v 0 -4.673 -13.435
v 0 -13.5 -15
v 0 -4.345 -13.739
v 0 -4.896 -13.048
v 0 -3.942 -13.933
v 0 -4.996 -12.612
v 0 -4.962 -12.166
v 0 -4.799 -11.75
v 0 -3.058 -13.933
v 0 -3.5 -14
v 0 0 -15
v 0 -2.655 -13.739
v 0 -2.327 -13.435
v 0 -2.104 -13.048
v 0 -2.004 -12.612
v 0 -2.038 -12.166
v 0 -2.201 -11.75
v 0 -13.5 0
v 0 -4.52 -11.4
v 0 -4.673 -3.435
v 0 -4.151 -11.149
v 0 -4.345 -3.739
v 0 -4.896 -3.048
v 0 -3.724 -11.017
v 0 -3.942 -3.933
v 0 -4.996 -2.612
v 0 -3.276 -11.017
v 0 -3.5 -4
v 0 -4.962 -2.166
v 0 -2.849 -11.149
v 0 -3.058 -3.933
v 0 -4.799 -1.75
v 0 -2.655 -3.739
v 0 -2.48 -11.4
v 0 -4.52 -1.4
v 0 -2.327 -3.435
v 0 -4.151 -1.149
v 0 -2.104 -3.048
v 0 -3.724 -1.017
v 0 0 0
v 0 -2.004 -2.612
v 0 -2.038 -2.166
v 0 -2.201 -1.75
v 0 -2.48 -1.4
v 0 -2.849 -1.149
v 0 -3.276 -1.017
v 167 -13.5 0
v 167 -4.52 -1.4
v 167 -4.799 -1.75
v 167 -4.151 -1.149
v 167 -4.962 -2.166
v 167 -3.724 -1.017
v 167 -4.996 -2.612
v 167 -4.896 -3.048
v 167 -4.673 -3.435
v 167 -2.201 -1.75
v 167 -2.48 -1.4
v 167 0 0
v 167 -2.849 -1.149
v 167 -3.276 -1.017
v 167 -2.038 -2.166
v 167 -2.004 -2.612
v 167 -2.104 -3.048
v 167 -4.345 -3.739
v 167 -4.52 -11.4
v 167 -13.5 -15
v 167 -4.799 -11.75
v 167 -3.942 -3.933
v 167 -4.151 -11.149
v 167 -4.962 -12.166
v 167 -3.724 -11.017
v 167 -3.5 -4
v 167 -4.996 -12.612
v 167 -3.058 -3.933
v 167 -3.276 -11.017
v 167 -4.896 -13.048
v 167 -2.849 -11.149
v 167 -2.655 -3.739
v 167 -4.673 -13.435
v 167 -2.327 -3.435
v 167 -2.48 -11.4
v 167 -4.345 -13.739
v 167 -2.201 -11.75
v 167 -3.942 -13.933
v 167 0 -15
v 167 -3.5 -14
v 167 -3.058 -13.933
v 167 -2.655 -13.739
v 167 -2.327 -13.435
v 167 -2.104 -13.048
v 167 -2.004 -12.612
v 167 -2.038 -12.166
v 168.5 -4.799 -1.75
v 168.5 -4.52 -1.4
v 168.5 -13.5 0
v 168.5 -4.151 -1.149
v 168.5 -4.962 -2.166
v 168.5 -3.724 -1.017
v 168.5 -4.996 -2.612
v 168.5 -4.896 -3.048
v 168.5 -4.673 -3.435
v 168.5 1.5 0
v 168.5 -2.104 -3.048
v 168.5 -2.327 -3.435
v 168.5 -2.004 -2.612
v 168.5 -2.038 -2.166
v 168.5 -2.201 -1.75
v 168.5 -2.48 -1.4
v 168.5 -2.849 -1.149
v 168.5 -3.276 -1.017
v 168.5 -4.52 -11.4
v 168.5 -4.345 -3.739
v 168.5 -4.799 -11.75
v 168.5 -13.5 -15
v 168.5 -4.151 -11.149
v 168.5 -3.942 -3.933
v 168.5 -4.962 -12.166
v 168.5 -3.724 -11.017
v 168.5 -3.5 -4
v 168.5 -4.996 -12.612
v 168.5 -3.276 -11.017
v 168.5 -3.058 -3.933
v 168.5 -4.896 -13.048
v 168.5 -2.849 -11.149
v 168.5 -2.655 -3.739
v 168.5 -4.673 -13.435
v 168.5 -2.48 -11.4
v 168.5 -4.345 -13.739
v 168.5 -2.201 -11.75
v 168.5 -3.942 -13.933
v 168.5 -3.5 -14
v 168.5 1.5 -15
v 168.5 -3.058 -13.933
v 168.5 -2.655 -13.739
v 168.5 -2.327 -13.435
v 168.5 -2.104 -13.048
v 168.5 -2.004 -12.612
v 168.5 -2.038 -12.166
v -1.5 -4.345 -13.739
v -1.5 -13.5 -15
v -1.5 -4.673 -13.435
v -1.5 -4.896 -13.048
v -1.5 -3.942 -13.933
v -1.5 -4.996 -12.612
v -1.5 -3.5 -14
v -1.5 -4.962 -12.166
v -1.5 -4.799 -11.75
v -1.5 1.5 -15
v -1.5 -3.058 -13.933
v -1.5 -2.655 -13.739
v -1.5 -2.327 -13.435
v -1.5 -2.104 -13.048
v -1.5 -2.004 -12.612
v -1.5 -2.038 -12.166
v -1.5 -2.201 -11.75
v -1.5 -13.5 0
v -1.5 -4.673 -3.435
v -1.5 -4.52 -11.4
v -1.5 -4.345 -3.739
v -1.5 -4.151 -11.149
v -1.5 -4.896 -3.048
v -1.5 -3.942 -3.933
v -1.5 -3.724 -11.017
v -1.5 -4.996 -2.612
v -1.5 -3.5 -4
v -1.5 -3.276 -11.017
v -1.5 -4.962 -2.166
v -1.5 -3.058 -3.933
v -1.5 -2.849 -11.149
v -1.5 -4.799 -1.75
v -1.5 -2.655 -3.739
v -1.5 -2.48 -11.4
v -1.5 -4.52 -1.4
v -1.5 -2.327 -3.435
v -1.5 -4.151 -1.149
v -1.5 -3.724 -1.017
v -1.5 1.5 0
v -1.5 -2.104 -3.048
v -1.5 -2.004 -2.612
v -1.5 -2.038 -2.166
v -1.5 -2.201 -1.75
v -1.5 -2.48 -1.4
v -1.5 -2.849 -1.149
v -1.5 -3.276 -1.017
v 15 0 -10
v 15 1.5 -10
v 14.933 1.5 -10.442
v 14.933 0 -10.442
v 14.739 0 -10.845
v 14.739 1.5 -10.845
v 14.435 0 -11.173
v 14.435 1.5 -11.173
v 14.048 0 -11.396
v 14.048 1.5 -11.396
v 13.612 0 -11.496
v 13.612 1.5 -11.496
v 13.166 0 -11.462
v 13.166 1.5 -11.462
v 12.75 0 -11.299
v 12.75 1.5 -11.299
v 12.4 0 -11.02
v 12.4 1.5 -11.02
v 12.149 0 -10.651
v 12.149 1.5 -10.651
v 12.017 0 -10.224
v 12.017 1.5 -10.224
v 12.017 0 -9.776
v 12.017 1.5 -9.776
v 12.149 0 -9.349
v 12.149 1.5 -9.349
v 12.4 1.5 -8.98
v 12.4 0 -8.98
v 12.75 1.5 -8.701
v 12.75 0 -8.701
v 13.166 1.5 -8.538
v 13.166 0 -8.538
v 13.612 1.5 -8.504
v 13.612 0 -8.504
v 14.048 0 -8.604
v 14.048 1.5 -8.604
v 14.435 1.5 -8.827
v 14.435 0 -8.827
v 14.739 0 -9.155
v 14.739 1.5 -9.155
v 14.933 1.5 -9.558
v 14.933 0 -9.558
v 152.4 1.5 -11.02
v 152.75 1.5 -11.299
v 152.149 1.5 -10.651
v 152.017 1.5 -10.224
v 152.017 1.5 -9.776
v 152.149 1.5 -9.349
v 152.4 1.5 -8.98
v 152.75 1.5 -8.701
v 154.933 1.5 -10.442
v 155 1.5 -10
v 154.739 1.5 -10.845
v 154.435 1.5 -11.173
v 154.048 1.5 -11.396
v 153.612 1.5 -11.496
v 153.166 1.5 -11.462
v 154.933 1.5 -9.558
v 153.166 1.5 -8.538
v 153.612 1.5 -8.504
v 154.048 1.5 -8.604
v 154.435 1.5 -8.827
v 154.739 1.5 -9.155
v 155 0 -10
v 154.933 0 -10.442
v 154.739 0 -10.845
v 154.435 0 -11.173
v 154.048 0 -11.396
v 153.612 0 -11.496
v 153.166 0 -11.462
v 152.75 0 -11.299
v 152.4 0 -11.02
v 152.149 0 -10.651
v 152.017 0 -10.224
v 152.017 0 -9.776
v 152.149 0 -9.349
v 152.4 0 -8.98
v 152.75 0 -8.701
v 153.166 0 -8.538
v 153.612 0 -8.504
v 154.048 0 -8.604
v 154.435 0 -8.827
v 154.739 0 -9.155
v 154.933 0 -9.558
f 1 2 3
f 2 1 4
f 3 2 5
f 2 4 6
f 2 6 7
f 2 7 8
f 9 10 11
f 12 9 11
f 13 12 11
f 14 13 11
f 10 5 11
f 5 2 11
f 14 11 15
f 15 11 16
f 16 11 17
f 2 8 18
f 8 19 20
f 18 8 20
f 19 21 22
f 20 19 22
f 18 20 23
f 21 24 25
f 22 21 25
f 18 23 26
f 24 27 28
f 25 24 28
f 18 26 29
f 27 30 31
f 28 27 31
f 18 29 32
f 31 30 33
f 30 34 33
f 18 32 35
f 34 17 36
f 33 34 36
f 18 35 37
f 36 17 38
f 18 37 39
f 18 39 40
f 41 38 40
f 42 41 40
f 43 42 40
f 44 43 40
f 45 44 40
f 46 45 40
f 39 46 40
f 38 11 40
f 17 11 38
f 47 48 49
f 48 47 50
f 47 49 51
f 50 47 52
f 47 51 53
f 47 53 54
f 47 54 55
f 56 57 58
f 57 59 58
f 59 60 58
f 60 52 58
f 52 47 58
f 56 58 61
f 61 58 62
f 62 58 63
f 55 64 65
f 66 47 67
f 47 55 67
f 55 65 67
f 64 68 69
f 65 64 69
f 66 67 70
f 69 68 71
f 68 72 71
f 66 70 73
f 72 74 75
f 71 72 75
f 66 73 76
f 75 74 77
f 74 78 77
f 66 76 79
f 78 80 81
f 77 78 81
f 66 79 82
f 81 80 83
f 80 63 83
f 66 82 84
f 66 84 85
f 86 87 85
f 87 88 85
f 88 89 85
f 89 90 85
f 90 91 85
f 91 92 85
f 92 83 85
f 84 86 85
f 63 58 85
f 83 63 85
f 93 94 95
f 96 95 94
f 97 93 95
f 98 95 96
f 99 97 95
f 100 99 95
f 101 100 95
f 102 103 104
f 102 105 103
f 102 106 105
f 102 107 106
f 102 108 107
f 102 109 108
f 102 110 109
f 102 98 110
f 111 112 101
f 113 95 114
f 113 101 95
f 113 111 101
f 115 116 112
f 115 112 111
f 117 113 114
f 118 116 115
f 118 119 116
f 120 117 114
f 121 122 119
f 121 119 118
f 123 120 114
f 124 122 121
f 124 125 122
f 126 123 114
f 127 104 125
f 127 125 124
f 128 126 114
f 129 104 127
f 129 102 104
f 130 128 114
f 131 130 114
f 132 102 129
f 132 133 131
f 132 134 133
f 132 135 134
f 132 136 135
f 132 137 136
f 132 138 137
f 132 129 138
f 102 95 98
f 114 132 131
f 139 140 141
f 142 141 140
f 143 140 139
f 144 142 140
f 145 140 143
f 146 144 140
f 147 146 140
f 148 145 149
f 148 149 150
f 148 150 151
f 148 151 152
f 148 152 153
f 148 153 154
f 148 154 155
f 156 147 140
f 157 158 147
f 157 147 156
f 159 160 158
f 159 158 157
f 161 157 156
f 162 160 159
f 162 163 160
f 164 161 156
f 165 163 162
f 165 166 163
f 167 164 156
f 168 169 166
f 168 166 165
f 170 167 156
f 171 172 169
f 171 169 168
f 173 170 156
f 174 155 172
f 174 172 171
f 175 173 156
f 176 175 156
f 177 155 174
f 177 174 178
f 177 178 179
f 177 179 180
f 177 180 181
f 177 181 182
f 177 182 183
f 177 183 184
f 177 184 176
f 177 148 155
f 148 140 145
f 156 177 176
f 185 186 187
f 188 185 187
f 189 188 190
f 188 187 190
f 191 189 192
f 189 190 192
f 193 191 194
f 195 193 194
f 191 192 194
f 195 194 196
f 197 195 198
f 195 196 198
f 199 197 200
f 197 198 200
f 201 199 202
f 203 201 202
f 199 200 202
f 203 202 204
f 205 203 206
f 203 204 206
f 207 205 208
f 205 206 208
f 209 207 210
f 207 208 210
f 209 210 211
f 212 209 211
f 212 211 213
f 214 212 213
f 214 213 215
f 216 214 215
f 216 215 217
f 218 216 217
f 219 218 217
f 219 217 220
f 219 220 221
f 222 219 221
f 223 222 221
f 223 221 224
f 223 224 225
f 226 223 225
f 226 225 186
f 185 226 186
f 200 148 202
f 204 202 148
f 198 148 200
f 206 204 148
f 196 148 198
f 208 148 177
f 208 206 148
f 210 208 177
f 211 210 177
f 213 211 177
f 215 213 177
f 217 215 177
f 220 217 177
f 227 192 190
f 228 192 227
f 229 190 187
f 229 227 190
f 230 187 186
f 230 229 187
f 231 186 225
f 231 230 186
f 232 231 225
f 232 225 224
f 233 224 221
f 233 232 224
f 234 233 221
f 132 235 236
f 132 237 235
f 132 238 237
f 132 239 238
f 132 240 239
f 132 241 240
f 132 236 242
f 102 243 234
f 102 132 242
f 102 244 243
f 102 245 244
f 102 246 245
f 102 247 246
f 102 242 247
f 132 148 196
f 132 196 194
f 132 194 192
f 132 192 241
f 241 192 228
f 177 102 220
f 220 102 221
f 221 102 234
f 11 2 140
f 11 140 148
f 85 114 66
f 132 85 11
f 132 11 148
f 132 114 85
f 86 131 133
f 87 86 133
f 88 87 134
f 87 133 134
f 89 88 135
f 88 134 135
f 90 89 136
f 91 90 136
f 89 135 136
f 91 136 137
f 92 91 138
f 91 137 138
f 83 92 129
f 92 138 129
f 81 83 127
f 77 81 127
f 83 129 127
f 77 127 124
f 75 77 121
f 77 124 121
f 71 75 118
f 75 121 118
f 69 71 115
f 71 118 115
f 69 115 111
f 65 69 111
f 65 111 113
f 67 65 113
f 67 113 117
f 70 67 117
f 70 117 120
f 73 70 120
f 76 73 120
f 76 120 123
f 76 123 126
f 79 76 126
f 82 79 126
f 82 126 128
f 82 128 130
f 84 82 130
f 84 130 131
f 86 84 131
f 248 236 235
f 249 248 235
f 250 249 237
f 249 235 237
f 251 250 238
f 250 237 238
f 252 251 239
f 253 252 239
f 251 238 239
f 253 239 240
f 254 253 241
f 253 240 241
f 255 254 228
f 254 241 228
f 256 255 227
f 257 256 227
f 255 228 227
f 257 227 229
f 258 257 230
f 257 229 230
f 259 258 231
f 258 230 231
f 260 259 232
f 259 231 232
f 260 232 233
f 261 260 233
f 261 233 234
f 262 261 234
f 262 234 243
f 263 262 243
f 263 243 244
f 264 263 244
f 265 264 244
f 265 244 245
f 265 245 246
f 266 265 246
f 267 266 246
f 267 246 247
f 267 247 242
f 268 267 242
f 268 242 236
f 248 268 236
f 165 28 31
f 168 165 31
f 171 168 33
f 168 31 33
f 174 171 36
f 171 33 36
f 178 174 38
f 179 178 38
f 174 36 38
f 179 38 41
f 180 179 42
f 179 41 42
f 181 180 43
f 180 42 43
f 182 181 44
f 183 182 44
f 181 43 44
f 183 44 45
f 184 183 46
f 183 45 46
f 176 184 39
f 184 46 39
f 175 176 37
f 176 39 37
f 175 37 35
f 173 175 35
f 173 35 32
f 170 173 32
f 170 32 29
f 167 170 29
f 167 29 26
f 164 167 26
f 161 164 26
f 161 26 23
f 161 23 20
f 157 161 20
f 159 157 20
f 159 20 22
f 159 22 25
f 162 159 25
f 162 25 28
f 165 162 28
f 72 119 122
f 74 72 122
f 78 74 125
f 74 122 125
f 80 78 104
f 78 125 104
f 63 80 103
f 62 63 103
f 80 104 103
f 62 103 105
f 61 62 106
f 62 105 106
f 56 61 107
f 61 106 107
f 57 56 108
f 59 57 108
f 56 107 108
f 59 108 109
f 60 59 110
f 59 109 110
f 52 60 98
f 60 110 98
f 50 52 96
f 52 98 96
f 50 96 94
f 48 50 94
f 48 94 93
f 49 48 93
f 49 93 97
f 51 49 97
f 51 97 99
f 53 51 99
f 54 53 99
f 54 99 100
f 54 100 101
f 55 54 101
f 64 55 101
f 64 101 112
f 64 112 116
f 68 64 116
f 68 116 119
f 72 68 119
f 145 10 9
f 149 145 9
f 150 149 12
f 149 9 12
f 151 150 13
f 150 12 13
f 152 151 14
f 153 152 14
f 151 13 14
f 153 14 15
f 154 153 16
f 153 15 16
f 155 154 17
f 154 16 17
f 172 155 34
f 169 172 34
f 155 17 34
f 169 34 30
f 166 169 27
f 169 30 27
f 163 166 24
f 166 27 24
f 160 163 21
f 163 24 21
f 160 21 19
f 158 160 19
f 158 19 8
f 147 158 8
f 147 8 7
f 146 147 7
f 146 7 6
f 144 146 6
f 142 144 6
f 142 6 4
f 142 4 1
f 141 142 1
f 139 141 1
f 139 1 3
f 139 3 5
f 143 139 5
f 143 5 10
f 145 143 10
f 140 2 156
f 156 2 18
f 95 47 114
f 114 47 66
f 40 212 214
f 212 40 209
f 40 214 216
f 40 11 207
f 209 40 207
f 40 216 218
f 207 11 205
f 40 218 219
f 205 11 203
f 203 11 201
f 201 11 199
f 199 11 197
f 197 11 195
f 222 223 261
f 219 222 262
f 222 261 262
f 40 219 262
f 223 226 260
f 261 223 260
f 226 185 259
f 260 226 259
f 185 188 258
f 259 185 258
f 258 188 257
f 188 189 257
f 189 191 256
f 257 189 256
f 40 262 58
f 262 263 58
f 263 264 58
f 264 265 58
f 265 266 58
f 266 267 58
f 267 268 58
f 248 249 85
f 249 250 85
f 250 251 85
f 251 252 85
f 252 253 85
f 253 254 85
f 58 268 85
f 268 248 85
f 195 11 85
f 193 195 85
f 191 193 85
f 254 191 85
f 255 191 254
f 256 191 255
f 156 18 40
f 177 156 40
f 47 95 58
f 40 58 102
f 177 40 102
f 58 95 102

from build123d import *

# Parameters (mm, degrees)
SKETCH1_W               = 167
SKETCH1_H               = 15
BOSS_EXTRUDE1_DEPTH     = 1.5
SKETCH2_W               = 15
SKETCH2_H               = 15
BOSS_EXTRUDE2_DEPTH     = 1.5
SKETCH3_W               = 15
SKETCH3_H               = 15
BOSS_EXTRUDE3_DEPTH     = 1.5
CUT_EXTRUDE1_DEPTH      = 1000
CUT_EXTRUDE1_DEPTH_BACK = 10000
SKETCH5_R               = 1.5
CUT_EXTRUDE2_DEPTH      = 10000
CUT_EXTRUDE2_DEPTH_BACK = 10000
SKETCH4_R               = 1.5


with BuildPart() as part:
    # Sketch1 → Boss-Extrude1 (new body)
    with BuildSketch(Plane(origin=(0, 0, 0), x_dir=(1, 0, 0), z_dir=(0, 1, 0))):
        with Locations((83.5, 7.5)):
            Rectangle(SKETCH1_W, SKETCH1_H)
    extrude(amount=BOSS_EXTRUDE1_DEPTH)

    # Sketch2 → Boss-Extrude2 (add)
    with BuildSketch(Plane(origin=(167, 0, 0), x_dir=(0, 0, -1), z_dir=(1, 0, 0))):
        with Locations((7.5, -6)):
            Rectangle(SKETCH2_W, SKETCH2_H)
    extrude(amount=BOSS_EXTRUDE2_DEPTH)

    # Sketch3 → Boss-Extrude3 (add)
    with BuildSketch(Plane.ZY):
        with Locations((-7.5, -6)):
            Rectangle(SKETCH3_W, SKETCH3_H)
    extrude(amount=BOSS_EXTRUDE3_DEPTH)

    # Sketch5 → Cut-Extrude1 (cut, two sides: drawn at the far end of the back side and taken through both)
    with BuildSketch(Plane(origin=(168.5, 0, 0), x_dir=(0, 0, -1), z_dir=(1, 0, 0)).offset(-CUT_EXTRUDE1_DEPTH_BACK)):
        with Locations((2.5, -3.5)):
            Circle(SKETCH5_R)
        with Locations((12.5, -3.5)):
            Circle(SKETCH5_R)
    extrude(amount=CUT_EXTRUDE1_DEPTH + CUT_EXTRUDE1_DEPTH_BACK, mode=Mode.SUBTRACT)

    # Sketch4 → Cut-Extrude2 (cut, two sides: drawn at the far end of the back side and taken through both)
    with BuildSketch(Plane(origin=(0, 1.5, 0), x_dir=(1, 0, 0), z_dir=(0, 1, 0)).offset(-CUT_EXTRUDE2_DEPTH_BACK)):
        with Locations((13.5, 10)):
            Circle(SKETCH4_R)
        with Locations((153.5, 10)):
            Circle(SKETCH4_R)
    extrude(amount=CUT_EXTRUDE2_DEPTH + CUT_EXTRUDE2_DEPTH_BACK, mode=Mode.SUBTRACT)


solid = part.part
